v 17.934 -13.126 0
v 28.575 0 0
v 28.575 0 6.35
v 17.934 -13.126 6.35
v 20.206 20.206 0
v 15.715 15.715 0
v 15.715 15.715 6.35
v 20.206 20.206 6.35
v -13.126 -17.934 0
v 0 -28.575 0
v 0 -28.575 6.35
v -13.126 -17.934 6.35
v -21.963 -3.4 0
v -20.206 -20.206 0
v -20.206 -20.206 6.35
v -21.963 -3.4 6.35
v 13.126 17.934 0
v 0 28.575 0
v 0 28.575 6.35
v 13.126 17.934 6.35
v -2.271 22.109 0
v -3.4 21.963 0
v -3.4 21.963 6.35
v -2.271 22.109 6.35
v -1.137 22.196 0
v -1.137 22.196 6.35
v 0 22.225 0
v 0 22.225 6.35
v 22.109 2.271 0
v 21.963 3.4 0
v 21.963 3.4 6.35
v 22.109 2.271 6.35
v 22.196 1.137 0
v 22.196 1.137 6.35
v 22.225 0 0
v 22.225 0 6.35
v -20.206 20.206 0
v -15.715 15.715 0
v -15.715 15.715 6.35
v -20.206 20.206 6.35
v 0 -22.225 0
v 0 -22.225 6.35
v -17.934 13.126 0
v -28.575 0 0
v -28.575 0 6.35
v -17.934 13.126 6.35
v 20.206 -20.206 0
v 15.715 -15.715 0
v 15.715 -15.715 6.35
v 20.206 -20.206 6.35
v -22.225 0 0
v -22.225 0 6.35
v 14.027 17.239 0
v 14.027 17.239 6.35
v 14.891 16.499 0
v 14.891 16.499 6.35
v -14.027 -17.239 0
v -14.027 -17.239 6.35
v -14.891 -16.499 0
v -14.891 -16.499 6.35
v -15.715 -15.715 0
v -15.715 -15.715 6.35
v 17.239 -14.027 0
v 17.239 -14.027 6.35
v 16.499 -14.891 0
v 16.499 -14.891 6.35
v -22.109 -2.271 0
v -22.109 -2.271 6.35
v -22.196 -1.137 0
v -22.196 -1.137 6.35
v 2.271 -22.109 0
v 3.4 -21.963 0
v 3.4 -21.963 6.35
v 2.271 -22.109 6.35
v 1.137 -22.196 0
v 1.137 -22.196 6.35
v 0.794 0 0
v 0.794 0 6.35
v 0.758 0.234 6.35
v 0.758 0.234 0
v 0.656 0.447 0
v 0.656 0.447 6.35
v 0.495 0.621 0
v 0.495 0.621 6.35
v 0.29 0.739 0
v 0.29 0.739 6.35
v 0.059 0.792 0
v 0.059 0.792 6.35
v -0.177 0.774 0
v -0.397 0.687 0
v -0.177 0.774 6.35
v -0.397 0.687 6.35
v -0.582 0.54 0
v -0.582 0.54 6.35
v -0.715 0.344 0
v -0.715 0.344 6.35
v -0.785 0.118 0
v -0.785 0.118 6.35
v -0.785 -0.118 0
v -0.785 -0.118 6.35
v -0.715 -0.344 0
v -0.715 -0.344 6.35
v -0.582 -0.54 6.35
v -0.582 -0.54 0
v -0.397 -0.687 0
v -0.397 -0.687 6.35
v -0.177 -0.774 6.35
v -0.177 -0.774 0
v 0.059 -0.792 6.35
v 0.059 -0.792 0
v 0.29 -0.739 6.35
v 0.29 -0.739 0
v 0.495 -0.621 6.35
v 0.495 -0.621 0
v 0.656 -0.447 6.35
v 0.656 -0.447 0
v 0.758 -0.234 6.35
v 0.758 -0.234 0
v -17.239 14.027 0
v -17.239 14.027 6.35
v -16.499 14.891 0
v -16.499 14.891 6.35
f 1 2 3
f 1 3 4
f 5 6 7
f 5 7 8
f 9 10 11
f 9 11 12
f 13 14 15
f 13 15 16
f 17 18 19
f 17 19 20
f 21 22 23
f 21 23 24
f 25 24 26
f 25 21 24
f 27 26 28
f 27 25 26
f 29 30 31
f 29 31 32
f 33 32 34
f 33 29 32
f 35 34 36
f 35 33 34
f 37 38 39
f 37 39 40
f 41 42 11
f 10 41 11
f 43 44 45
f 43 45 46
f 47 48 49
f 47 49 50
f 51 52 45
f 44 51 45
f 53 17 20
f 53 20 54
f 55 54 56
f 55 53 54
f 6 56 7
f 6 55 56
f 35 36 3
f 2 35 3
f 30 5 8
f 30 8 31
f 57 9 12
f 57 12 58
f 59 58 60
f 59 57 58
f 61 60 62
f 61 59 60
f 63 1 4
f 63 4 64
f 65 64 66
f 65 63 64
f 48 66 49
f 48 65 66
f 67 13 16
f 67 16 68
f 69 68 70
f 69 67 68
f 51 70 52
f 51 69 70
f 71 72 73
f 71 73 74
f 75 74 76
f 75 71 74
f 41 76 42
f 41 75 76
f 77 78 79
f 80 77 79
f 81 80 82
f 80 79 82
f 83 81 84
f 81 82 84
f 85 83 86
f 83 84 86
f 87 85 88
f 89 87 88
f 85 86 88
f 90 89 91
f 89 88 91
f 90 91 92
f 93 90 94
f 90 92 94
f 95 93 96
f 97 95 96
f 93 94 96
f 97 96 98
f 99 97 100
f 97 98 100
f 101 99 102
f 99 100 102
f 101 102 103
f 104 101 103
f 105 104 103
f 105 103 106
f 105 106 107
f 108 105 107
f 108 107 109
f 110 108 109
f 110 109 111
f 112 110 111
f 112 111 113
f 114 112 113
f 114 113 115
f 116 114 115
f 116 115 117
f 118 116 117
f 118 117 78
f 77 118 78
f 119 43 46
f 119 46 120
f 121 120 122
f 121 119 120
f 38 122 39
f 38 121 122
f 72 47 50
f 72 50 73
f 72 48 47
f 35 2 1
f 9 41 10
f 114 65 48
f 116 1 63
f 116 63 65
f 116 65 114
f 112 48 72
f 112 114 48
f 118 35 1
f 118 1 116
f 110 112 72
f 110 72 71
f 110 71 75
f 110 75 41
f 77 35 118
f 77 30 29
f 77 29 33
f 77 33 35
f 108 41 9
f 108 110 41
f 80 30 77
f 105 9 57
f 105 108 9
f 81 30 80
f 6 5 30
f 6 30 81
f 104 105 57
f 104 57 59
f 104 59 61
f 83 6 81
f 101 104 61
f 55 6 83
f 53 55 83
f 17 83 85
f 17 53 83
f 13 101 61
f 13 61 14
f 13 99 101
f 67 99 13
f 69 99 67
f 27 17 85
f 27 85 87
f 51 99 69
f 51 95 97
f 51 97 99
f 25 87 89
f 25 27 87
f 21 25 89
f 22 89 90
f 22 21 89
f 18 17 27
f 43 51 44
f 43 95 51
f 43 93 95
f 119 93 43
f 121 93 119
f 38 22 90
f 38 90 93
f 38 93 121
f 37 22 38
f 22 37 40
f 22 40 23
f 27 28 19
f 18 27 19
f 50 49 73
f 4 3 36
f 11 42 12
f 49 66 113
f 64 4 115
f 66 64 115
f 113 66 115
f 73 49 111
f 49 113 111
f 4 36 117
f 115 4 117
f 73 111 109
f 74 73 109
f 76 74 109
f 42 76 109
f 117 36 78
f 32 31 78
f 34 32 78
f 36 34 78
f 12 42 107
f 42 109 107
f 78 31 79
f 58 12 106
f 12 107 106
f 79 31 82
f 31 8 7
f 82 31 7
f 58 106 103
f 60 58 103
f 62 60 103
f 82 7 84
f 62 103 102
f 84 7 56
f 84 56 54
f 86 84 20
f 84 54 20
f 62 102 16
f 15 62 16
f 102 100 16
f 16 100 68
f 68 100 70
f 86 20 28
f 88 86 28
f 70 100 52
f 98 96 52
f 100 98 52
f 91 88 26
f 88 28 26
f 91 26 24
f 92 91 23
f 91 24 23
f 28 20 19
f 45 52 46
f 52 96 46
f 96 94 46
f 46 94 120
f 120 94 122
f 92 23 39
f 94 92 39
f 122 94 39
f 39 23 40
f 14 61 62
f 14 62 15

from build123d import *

# Parameters (mm, degrees)
BOSS_EXTRUDE1_DEPTH = 6.35
SKETCH2_R           = 0.79375
CUT_EXTRUDE1_DEPTH  = 41.907013457


with BuildPart() as part:
    # Sketch1 → Boss-Extrude1 (new body)
    with BuildSketch(Plane.XY):
        with BuildLine():
            Line((0, 22.225), (0, 28.575))
            Line((0, 28.575), (13.126483451, 17.934493503))
            ThreePointArc((13.126483451, 17.934493503), (14.463585172, 16.87469493), (15.715448212, 15.715448212))
            Line((15.715448212, 15.715448212), (20.205576272, 20.205576272))
            Line((20.205576272, 20.205576272), (21.963427435, 3.399776512))
            ThreePointArc((21.963427435, 3.399776512), (22.159510371, 1.70491206), (22.225, 0))
            Line((22.225, 0), (28.575, 0))
            Line((28.575, 0), (17.934493503, -13.126483451))
            ThreePointArc((17.934493503, -13.126483451), (16.87469493, -14.463585172), (15.715448212, -15.715448212))
            Line((15.715448212, -15.715448212), (20.205576272, -20.205576272))
            Line((20.205576272, -20.205576272), (3.399776512, -21.963427435))
            ThreePointArc((3.399776512, -21.963427435), (1.70491206, -22.159510371), (0, -22.225))
            Line((0, -22.225), (0, -28.575))
            Line((0, -28.575), (-13.126483451, -17.934493503))
            ThreePointArc((-13.126483451, -17.934493503), (-14.463585172, -16.87469493), (-15.715448212, -15.715448212))
            Line((-15.715448212, -15.715448212), (-20.205576272, -20.205576272))
            Line((-20.205576272, -20.205576272), (-21.963427435, -3.399776512))
            ThreePointArc((-21.963427435, -3.399776512), (-22.159510371, -1.70491206), (-22.225, 0))
            Line((-22.225, 0), (-28.575, 0))
            Line((-28.575, 0), (-17.934493503, 13.126483451))
            ThreePointArc((-17.934493503, 13.126483451), (-16.87469493, 14.463585172), (-15.715448212, 15.715448212))
            Line((-15.715448212, 15.715448212), (-20.205576272, 20.205576272))
            Line((-20.205576272, 20.205576272), (-3.399776512, 21.963427435))
            ThreePointArc((-3.399776512, 21.963427435), (-1.70491206, 22.159510371), (0, 22.225))
        make_face()
    extrude(amount=BOSS_EXTRUDE1_DEPTH)

    # Sketch2 → Cut-Extrude1 (cut, through all)
    with BuildSketch(Plane.XY.offset(6.35)):
        Circle(SKETCH2_R)
    extrude(amount=-CUT_EXTRUDE1_DEPTH, mode=Mode.SUBTRACT)


solid = part.part
